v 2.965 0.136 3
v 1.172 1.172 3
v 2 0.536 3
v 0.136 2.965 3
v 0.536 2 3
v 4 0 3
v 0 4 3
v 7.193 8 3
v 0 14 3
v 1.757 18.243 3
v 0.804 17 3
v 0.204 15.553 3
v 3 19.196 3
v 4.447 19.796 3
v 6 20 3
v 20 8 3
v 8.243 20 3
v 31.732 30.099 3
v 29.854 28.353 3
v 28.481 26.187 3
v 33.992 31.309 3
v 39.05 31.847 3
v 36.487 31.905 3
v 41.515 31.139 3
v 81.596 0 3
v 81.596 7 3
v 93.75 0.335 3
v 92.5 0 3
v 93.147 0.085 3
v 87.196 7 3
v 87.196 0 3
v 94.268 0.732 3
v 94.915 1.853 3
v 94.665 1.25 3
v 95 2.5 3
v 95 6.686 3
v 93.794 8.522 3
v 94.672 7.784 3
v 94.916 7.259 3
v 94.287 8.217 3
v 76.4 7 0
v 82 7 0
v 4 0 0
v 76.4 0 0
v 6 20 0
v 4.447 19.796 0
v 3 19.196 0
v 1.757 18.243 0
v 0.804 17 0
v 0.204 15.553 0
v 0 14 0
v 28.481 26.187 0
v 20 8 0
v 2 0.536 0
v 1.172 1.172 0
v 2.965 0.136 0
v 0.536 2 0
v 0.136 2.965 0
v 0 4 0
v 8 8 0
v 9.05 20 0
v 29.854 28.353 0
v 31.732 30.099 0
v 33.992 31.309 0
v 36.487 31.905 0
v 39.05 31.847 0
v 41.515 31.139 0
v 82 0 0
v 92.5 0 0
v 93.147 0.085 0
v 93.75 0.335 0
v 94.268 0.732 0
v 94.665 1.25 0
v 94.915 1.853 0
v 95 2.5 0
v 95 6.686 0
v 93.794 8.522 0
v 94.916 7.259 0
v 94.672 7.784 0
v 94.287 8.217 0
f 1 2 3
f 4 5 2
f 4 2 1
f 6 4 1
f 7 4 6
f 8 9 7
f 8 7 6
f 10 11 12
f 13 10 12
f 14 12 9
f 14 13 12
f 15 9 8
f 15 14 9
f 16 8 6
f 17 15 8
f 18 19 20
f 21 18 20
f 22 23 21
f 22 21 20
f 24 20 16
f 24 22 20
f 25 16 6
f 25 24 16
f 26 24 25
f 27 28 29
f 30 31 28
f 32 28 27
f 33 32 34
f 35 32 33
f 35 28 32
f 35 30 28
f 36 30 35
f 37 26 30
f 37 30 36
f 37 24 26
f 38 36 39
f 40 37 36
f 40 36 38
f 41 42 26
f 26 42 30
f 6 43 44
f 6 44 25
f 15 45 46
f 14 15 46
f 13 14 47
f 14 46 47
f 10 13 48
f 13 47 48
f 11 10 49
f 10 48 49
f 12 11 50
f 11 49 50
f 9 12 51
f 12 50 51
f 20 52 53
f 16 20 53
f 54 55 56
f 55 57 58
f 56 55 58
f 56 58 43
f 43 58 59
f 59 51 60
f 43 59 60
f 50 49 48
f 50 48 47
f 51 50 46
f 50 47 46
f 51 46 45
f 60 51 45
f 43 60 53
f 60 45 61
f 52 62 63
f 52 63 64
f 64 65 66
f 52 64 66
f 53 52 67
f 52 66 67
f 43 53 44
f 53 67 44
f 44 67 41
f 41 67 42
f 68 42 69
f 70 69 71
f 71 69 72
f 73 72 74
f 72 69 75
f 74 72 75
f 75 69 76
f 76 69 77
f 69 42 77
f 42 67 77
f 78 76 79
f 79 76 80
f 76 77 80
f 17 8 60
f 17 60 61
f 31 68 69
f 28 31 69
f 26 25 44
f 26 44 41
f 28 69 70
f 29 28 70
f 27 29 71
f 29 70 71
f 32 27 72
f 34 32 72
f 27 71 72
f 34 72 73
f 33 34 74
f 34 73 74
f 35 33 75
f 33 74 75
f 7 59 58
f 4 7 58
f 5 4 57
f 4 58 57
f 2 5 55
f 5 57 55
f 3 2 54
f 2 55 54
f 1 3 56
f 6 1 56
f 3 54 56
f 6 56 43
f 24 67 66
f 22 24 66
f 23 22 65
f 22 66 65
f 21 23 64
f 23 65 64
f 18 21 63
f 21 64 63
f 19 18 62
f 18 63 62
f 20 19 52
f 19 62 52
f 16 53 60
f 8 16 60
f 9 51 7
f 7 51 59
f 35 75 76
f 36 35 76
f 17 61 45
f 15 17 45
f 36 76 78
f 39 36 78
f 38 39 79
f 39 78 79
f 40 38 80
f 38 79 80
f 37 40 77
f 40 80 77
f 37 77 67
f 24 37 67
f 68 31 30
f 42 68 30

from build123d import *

# Parameters (mm, degrees)
F1_DEPTH = 3
F5_SIZE2 = 0.803838
F5_SIZE  = 2.99999
F4_W     = 7
F4_H     = 2.8
F6_DEPTH = 12.5


# Not quite as in the source:
# - a fillet or chamfer is up to 0.001 mm smaller than in the source, because OpenCascade refuses the exact size


with BuildPart() as f1:
    # F0 (on Top) → F1 (new body)
    with BuildSketch(Plane.XY):
        with BuildLine():
            Line((4, 0), (92.5, 0))
            ThreePointArc((92.5, 0), (94.267766953, 0.732233047), (95, 2.5))
            Line((95, 2.5), (95, 6.6861086512))
            ThreePointArc((95, 6.6861086512), (94.6715622153, 7.784234218), (93.7941202395, 8.5216938563))
            Line((93.7941202395, 8.5216938563), (41.5145959947, 31.1391284496))
            ThreePointArc((41.5145959947, 31.1391284496), (33.9924781689, 31.3092893749), (28.4809169267, 26.1873850415))
            Line((28.4809169267, 26.1873850415), (20, 8))
            Line((20, 8), (8, 8))
            Line((8, 8), (9.0498639623, 20))
            Line((9.0498639623, 20), (6, 20))
            ThreePointArc((6, 20), (1.7573593129, 18.2426406871), (0, 14))
            Line((0, 14), (0, 4))
            ThreePointArc((0, 4), (1.1715728753, 1.1715728753), (4, 0))
        make_face()
    extrude(amount=F1_DEPTH)

    # F5 (size 3 and 0.8038475773 in the source; OpenCascade refuses exactly that, so slightly less here)
    f5_edges = [f1.edges().sort_by_distance(p)[0] for p in [
        (8.524932, 14, 3),
    ]]
    f5_side = f1.faces().sort_by_distance((8.524932, 14, 1.5))[0]
    chamfer(f5_edges, length=F5_SIZE, length2=F5_SIZE2, reference=f5_side)

    # F4 (on line) → F6 (cut, symmetric)
    with BuildSketch(Plane(origin=(61.5, 0, 35.5070415552), x_dir=(0, 1, 0), z_dir=(0.8660254038, 0, 0.5))):
        with Locations((3.5, -39.6)):
            Rectangle(F4_W, F4_H)
    extrude(amount=F6_DEPTH, both=True, mode=Mode.SUBTRACT)


solid = f1.part
